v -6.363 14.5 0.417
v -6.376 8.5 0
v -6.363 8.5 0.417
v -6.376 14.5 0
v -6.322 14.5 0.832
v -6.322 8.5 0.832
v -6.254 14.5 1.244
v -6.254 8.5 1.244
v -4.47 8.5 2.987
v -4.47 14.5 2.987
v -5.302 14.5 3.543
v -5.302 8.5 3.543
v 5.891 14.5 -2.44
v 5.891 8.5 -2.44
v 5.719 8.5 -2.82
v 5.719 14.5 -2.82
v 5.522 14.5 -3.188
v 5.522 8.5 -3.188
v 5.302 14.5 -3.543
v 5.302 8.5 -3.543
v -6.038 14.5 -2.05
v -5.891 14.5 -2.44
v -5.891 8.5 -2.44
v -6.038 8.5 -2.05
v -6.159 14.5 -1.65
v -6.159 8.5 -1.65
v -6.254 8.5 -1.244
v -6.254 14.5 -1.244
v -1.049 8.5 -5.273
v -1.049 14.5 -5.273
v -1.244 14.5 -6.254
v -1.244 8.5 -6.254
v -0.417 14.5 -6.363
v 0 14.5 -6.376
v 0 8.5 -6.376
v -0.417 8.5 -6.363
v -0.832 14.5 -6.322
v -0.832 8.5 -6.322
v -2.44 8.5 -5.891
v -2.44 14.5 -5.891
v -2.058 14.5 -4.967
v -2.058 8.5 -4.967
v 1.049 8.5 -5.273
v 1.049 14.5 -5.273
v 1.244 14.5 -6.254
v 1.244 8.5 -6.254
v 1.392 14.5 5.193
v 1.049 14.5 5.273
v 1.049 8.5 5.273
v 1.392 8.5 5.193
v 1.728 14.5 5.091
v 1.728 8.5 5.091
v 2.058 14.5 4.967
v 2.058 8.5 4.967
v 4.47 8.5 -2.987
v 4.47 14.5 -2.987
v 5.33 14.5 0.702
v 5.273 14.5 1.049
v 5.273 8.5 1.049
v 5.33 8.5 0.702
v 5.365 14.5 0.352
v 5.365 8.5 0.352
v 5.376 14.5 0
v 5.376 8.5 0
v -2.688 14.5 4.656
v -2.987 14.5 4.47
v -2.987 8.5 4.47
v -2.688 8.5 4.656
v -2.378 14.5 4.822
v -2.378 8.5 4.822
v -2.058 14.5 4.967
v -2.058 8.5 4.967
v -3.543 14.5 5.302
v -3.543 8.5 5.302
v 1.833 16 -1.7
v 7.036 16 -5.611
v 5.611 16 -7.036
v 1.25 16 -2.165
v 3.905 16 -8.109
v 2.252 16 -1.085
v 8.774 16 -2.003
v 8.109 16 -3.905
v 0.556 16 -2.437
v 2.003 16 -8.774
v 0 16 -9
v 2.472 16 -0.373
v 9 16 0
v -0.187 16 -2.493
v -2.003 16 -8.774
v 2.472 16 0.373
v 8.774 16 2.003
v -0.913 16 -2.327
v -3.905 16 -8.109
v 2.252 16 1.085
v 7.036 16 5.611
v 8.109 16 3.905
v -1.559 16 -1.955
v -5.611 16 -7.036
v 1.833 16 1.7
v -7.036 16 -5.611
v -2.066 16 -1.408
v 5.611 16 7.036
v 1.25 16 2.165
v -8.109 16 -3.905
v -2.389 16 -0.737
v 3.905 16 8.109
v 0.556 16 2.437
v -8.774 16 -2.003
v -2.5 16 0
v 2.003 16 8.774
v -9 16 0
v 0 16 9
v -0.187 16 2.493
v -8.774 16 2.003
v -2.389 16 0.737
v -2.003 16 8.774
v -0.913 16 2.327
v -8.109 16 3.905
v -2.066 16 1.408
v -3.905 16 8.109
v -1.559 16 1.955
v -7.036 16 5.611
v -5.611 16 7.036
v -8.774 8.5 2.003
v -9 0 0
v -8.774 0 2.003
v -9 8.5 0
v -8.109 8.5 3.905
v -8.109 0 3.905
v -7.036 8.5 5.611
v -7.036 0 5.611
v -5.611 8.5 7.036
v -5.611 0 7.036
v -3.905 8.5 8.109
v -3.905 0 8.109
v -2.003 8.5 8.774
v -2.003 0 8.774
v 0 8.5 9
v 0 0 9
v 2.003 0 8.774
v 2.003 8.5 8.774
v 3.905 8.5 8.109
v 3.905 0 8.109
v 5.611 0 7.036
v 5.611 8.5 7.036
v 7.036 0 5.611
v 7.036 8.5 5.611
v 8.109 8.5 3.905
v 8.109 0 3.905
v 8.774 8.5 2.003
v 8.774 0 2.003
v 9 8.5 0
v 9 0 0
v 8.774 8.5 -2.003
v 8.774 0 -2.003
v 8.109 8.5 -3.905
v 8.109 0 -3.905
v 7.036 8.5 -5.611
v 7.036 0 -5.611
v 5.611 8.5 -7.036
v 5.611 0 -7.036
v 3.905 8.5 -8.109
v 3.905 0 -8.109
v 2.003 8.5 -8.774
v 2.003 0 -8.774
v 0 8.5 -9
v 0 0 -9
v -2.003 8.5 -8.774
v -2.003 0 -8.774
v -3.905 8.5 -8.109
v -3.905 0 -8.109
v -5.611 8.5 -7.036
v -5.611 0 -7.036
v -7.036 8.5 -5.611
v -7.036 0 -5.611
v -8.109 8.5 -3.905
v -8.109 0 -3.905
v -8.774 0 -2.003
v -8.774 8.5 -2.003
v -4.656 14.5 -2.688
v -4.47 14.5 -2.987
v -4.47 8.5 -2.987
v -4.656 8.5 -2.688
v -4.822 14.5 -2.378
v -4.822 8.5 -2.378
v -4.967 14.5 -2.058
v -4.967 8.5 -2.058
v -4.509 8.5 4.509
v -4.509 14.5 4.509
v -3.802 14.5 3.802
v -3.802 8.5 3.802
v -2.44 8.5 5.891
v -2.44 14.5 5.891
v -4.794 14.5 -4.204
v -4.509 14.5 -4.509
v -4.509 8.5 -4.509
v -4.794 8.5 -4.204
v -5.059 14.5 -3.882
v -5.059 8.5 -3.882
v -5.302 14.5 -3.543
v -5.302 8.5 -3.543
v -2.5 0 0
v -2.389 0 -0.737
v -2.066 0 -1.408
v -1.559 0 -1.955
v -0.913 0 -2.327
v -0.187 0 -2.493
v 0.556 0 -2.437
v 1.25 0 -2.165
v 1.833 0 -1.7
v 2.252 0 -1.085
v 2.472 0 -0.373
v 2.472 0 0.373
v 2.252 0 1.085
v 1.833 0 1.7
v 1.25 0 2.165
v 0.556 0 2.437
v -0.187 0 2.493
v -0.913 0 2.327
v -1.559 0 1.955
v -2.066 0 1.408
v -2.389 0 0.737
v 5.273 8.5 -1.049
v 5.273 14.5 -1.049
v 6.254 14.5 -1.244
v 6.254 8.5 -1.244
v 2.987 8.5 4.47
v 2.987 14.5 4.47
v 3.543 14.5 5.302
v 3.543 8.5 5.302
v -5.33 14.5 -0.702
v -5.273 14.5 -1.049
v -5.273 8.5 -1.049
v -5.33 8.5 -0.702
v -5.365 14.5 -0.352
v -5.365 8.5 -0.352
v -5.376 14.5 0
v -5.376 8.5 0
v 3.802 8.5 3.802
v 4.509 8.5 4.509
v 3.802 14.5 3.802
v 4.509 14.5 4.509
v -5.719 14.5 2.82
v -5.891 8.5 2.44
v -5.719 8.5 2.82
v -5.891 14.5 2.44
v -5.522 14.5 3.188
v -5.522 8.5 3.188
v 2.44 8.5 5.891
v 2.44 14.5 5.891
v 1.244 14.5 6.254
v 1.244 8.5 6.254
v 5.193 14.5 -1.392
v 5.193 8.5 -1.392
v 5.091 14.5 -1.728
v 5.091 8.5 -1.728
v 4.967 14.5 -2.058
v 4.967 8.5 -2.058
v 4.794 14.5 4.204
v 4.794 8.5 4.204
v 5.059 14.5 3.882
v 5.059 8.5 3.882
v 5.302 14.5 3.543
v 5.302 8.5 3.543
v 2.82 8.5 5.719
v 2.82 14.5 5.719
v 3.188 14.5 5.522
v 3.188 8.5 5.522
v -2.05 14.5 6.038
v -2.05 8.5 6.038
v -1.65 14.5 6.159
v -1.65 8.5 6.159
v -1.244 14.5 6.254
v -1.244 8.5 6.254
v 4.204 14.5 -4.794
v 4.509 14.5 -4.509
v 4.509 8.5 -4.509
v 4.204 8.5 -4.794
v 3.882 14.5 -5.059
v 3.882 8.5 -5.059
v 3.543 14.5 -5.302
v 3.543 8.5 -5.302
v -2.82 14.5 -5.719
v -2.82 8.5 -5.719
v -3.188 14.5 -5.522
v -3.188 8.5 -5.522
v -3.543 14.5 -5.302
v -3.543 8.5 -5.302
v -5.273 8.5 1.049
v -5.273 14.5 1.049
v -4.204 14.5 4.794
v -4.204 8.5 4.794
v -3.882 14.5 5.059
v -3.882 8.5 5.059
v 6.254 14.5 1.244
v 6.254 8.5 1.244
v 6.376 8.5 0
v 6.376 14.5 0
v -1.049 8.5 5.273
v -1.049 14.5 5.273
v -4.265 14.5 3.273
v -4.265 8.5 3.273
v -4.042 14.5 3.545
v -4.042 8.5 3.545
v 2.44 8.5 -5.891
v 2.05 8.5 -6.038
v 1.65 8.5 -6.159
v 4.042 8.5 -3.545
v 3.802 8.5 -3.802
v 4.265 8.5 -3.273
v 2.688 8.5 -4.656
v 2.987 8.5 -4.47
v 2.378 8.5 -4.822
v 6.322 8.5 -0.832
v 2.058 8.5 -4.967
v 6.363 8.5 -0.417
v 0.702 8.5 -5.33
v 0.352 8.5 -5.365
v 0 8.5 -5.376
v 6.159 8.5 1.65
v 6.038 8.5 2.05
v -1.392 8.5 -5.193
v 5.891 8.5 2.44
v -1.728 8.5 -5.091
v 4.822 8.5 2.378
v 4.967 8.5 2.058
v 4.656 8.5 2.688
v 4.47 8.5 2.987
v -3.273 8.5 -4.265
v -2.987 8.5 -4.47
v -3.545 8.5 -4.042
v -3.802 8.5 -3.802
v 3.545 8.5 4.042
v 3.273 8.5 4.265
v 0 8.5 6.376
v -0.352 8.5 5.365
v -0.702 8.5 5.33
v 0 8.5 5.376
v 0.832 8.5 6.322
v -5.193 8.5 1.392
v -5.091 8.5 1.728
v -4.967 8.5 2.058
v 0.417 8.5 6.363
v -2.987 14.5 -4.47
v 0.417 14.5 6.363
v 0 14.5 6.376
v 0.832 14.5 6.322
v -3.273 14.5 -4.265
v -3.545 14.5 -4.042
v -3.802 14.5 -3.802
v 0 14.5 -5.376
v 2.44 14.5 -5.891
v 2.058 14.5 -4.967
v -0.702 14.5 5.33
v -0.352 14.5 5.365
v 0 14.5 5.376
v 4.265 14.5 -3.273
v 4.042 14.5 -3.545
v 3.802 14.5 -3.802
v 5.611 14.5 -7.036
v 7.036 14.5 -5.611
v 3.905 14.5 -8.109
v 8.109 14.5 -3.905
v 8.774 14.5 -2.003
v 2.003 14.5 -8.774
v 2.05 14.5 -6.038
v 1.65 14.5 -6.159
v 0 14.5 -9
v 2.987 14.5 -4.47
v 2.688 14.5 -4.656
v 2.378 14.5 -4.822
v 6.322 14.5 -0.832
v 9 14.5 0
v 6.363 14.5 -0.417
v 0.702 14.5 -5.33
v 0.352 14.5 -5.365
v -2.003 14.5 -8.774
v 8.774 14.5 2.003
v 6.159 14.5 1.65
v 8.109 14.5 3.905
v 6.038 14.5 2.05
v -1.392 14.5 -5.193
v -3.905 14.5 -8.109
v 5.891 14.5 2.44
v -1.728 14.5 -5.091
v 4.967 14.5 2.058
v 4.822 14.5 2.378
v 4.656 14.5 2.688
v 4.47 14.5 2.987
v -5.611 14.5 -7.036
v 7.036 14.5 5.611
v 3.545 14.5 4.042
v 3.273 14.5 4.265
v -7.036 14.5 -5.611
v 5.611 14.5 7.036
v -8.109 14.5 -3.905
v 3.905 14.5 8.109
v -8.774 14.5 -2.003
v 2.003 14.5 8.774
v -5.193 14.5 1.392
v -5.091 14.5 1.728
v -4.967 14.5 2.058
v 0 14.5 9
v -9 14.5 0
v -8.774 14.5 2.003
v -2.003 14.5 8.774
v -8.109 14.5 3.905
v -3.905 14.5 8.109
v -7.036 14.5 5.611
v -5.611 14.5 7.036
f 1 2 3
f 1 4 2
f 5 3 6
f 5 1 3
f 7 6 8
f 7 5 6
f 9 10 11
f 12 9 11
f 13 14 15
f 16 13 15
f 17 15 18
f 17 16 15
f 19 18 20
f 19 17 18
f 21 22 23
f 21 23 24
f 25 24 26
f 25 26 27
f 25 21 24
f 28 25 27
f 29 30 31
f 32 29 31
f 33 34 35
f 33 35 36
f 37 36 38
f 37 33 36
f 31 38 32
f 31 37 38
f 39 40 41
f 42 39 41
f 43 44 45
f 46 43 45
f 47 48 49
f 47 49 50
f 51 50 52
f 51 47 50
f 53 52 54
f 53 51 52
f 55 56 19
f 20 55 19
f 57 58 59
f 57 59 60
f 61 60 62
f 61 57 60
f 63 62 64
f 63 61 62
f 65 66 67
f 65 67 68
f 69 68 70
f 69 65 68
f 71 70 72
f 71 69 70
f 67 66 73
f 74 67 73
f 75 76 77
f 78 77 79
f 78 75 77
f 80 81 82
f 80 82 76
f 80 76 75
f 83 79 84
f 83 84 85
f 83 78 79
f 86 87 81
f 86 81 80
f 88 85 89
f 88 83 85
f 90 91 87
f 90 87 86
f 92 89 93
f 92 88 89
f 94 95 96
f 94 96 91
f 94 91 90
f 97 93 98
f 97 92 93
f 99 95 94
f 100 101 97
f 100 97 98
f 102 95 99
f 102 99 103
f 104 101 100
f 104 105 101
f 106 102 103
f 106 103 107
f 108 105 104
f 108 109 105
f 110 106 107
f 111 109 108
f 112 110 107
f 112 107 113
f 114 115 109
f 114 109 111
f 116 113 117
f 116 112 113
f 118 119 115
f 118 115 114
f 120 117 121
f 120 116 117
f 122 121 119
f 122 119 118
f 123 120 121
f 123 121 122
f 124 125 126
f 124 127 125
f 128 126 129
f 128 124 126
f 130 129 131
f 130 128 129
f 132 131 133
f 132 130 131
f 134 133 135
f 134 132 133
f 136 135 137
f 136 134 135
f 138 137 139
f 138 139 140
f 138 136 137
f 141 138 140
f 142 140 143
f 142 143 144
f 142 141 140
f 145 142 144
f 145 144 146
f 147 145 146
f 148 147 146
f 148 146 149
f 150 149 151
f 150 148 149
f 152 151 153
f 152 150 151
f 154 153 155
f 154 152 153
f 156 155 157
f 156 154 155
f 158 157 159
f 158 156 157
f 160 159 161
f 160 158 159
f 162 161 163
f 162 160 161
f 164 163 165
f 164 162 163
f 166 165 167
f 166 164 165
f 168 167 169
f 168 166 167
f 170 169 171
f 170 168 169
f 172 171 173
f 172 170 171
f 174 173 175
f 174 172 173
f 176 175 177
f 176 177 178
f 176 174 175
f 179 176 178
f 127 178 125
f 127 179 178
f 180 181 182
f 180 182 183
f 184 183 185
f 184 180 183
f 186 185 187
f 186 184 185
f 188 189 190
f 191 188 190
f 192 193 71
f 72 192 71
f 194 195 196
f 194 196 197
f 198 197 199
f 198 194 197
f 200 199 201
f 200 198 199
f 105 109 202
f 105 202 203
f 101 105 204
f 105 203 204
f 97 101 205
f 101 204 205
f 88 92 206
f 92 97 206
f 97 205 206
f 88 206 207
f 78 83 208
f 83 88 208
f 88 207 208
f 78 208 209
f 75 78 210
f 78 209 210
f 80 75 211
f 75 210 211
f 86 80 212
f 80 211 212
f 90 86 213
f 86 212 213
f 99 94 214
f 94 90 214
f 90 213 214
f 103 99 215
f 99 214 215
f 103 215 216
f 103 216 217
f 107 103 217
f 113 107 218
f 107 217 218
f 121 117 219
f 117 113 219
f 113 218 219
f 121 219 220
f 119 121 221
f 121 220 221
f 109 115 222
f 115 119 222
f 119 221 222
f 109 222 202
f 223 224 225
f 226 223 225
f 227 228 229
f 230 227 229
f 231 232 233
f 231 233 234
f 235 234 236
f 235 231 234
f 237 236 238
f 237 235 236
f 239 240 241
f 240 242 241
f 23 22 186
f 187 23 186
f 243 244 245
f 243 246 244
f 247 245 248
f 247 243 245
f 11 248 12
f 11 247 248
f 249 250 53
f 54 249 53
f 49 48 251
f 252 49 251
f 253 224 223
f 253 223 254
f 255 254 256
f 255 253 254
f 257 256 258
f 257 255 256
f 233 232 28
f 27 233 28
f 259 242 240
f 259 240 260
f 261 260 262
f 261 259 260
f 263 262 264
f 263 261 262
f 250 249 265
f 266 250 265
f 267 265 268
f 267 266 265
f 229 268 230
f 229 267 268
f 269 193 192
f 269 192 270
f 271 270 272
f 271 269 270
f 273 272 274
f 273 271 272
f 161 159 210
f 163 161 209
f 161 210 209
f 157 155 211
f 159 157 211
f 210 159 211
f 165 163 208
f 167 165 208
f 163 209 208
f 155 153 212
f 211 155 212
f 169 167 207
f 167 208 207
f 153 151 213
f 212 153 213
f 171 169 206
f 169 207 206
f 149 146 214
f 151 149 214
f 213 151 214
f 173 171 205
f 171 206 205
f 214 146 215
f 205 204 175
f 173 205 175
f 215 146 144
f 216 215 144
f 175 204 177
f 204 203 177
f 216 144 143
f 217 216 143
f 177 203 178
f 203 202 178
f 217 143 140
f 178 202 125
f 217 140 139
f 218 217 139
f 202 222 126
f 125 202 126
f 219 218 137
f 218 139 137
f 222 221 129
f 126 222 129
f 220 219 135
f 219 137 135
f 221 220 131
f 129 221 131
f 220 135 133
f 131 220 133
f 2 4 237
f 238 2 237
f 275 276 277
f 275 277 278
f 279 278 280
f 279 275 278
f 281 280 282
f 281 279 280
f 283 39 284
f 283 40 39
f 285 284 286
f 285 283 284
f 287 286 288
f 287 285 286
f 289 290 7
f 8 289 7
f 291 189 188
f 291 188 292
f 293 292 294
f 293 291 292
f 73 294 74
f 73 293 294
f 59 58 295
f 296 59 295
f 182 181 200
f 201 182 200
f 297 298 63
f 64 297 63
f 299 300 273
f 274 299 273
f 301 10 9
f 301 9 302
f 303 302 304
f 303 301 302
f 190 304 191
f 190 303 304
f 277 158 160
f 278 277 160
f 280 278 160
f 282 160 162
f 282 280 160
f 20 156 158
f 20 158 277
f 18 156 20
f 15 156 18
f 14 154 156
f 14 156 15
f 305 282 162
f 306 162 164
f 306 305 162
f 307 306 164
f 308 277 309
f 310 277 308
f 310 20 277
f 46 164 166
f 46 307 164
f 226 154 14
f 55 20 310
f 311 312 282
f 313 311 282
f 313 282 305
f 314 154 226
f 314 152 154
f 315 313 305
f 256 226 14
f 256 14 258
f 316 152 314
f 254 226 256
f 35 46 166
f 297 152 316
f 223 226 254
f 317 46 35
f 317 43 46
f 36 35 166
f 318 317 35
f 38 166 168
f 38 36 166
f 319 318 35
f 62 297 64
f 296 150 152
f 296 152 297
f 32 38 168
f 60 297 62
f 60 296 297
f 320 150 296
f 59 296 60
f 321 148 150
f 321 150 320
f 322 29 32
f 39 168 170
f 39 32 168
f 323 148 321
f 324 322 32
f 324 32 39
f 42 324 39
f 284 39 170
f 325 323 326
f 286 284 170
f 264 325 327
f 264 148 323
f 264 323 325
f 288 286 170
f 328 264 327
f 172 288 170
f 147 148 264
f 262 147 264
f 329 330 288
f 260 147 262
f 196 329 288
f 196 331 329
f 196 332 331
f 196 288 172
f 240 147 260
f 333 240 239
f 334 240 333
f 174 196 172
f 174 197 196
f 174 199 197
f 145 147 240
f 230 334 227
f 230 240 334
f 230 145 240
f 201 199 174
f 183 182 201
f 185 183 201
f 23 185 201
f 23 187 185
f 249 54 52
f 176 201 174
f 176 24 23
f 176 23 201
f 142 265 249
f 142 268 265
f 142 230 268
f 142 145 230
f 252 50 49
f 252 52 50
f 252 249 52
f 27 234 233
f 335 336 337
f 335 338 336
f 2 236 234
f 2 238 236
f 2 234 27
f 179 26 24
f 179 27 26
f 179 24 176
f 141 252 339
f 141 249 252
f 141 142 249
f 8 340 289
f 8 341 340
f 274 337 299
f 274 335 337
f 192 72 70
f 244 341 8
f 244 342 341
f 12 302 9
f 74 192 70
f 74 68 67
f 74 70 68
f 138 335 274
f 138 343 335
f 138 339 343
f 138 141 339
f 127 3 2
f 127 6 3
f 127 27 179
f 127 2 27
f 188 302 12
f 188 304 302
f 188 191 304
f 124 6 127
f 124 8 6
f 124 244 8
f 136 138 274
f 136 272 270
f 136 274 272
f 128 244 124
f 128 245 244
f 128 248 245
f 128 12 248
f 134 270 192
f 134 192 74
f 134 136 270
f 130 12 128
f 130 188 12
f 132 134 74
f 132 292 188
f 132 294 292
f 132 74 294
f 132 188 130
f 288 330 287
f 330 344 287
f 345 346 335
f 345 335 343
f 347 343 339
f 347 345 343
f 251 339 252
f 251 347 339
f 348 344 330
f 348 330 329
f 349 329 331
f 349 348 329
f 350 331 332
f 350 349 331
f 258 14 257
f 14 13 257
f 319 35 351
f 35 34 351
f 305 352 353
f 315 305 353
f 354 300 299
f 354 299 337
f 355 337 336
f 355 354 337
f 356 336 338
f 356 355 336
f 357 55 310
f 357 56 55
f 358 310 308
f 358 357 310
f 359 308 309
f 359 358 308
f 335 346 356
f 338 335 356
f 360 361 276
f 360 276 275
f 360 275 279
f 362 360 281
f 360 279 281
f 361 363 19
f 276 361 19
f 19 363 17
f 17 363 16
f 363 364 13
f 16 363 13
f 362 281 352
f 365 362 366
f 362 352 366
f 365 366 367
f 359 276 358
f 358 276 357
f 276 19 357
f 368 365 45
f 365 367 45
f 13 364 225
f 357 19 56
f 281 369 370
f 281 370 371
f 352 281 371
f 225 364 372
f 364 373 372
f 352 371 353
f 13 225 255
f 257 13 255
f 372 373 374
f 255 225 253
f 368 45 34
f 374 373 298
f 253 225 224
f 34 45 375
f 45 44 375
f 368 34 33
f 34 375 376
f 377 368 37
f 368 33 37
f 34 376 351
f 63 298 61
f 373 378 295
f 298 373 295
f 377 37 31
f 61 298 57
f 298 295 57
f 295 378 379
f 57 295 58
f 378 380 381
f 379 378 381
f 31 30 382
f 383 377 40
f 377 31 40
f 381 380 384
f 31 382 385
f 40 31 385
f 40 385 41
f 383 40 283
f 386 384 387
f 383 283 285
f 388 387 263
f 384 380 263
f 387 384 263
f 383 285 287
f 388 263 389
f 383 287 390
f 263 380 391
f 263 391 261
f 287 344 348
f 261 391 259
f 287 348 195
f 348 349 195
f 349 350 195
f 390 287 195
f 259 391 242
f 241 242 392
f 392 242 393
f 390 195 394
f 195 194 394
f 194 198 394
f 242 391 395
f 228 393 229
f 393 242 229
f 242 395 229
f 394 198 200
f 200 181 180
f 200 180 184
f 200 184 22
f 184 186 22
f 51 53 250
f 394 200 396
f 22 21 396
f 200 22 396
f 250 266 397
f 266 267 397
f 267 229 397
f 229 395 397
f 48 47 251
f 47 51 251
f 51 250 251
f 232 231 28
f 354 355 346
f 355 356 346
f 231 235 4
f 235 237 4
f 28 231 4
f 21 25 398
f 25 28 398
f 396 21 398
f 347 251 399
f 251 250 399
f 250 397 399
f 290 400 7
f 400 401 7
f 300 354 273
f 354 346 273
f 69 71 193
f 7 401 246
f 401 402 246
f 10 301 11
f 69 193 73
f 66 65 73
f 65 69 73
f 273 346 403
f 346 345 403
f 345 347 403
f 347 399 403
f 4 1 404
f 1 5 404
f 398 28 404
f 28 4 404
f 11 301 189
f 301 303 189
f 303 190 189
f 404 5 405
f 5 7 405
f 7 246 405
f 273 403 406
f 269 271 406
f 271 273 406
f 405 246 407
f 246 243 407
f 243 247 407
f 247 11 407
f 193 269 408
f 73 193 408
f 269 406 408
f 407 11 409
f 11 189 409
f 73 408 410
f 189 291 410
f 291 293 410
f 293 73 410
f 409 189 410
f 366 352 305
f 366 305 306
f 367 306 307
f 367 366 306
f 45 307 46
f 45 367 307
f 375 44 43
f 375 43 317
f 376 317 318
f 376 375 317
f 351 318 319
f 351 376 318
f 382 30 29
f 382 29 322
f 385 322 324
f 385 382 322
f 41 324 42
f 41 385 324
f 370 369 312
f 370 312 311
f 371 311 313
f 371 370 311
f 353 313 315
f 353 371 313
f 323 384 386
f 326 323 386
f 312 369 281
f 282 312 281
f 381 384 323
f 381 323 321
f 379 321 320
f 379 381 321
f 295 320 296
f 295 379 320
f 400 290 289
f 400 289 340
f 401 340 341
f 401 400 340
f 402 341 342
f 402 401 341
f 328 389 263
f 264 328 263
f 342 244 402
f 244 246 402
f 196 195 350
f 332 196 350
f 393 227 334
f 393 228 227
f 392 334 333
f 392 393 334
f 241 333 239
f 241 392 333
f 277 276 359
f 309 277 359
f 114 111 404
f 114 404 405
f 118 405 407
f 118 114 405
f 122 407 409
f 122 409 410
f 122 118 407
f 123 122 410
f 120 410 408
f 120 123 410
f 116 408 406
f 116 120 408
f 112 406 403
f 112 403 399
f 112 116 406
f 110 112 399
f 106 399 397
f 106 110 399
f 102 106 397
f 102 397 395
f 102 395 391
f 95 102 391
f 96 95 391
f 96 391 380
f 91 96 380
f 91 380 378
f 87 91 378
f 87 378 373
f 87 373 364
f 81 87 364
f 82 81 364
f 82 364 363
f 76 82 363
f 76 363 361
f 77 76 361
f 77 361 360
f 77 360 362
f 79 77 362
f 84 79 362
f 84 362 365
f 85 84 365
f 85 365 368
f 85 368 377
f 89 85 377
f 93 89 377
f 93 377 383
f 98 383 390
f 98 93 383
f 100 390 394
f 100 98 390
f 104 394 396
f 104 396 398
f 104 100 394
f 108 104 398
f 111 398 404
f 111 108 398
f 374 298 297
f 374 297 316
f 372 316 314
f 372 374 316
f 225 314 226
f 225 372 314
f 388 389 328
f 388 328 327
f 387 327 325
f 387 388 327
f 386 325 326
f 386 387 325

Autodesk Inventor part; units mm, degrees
ref_plane "Work Plane1" through (0, 16, 0) normal (0, 1, 0) x (-1, 0, 0)
sketch "Sketch1" plane through (0, 16, 0) normal (0, 1, 0) x (-1, 0, 0)
  circle A0 centre (0, 0) radius 9
extrude "Extrusion3" add sketch "Sketch1" against normal blind 16
ref_plane "Work Plane2" through (0, 14.5, 0) normal (0, 1, 0) x (-1, 0, 0)
sketch "Sketch2" plane through (0, 14.5, 0) normal (0, 1, 0) x (-1, 0, 0)
  arc A0 (4.4703, 2.987) -> (3.8017, 3.8017) centre (0, 0) ccw
  line L0 (2.987, -4.4703) -> (3.5426, -5.3018)
  arc A1 (-5.8911, -2.4402) -> (-5.3018, -3.5426) centre (0, 0) ccw
  line L1 (-2.4402, 5.8911) -> (-2.0575, 4.9672)
  line L2 (2.987, 4.4703) -> (3.5426, 5.3018)
  arc A2 (4.5088, -4.5088) -> (5.3018, -3.5426) centre (0, 0) ccw
  line L3 (-4.5088, -4.5088) -> (-3.8017, -3.8017)
  arc A3 (-2.987, 4.4703) -> (-3.8017, 3.8017) centre (0, 0) ccw
  arc A4 (2.4402, 5.8911) -> (1.244, 6.2539) centre (0, 0) ccw
  line L4 (5.8911, -2.4402) -> (4.9672, -2.0575)
  arc A5 (-2.987, -4.4703) -> (-2.0575, -4.9672) centre (0, 0) ccw
  line L5 (-4.4703, 2.987) -> (-5.3018, 3.5426)
  line L6 (0, 6.3764) -> (0, 5.3764)
  arc A6 (5.2731, -1.0489) -> (5.3764, 0) centre (0, 0) ccw
  line L7 (-1.0489, -5.2731) -> (-1.244, -6.2539)
  arc A7 (-5.8911, 2.4402) -> (-6.2539, 1.244) centre (0, 0) ccw
  line L8 (5.2731, 1.0489) -> (6.2539, 1.244)
  arc A8 (0, -6.3764) -> (1.244, -6.2539) centre (0, 0) ccw
  line L9 (-6.3764, 0) -> (-5.3764, 0)
  arc A9 (5.8911, 2.4402) -> (5.3018, 3.5426) centre (0, 0) ccw
  line L10 (2.4402, -5.8911) -> (2.0575, -4.9672)
  arc A10 (-5.2731, -1.0489) -> (-4.9672, -2.0575) centre (0, 0) ccw
  line L11 (-1.0489, 5.2731) -> (-1.244, 6.2539)
  line L12 (4.5088, 4.5088) -> (3.8017, 3.8017)
  arc A11 (2.987, -4.4703) -> (3.8017, -3.8017) centre (0, 0) ccw
  line L13 (-4.4703, -2.987) -> (-5.3018, -3.5426)
  arc A12 (-2.4402, 5.8911) -> (-3.5426, 5.3018) centre (0, 0) ccw
  arc A13 (2.987, 4.4703) -> (2.0575, 4.9672) centre (0, 0) ccw
  line L14 (4.4703, -2.987) -> (5.3018, -3.5426)
  arc A14 (-4.5088, -4.5088) -> (-3.5426, -5.3018) centre (0, 0) ccw
  line L15 (-4.5088, 4.5088) -> (-3.8017, 3.8017)
  line L16 (1.0489, 5.2731) -> (1.244, 6.2539)
  arc A15 (5.8911, -2.4402) -> (6.2539, -1.244) centre (0, 0) ccw
  line L17 (-2.4402, -5.8911) -> (-2.0575, -4.9672)
  arc A16 (-4.4703, 2.987) -> (-4.9672, 2.0575) centre (0, 0) ccw
  arc A17 (0, 6.3764) -> (-1.244, 6.2539) centre (0, 0) ccw
  line L18 (6.3764, 0) -> (5.3764, 0)
  arc A18 (-1.0489, -5.2731) -> (0, -5.3764) centre (0, 0) ccw
  line L19 (-5.2731, 1.0489) -> (-6.2539, 1.244)
  arc A19 (5.2731, 1.0489) -> (4.9672, 2.0575) centre (0, 0) ccw
  line L20 (1.0489, -5.2731) -> (1.244, -6.2539)
  arc A20 (-6.3764, 0) -> (-6.2539, -1.244) centre (0, 0) ccw
  line L21 (4.4703, 2.987) -> (5.3018, 3.5426)
  arc A21 (2.4402, -5.8911) -> (3.5426, -5.3018) centre (0, 0) ccw
  line L22 (-5.8911, -2.4402) -> (-4.9672, -2.0575)
  arc A22 (-1.0489, 5.2731) -> (-2.0575, 4.9672) centre (0, 0) ccw
  arc A23 (4.5088, 4.5088) -> (3.5426, 5.3018) centre (0, 0) ccw
  line L23 (4.5088, -4.5088) -> (3.8017, -3.8017)
  arc A24 (-4.4703, -2.987) -> (-3.8017, -3.8017) centre (0, 0) ccw
  line L24 (-2.987, 4.4703) -> (-3.5426, 5.3018)
  line L25 (2.4402, 5.8911) -> (2.0575, 4.9672)
  arc A25 (4.4703, -2.987) -> (4.9672, -2.0575) centre (0, 0) ccw
  line L26 (-2.987, -4.4703) -> (-3.5426, -5.3018)
  arc A26 (-4.5088, 4.5088) -> (-5.3018, 3.5426) centre (0, 0) ccw
  arc A27 (1.0489, 5.2731) -> (0, 5.3764) centre (0, 0) ccw
  line L27 (5.2731, -1.0489) -> (6.2539, -1.244)
  arc A28 (-2.4402, -5.8911) -> (-1.244, -6.2539) centre (0, 0) ccw
  line L28 (-5.8911, 2.4402) -> (-4.9672, 2.0575)
  circle A29 centre (0, 0) radius 9
  arc A30 (6.3764, 0) -> (6.2539, 1.244) centre (0, 0) ccw
  line L29 (0, -6.3764) -> (0, -5.3764)
  arc A31 (-5.2731, 1.0489) -> (-5.3764, 0) centre (0, 0) ccw
  line L30 (5.8911, 2.4402) -> (4.9672, 2.0575)
  arc A32 (1.0489, -5.2731) -> (2.0575, -4.9672) centre (0, 0) ccw
  line L31 (-5.2731, -1.0489) -> (-6.2539, -1.244)
extrude "Extrusion2" cut sketch "Sketch2" against normal blind 6
sketch "Sketch3" plane through (0, 0, 0) normal (0, 1, 0) x (-1, 0, 0)
  circle A0 centre (0, 0) radius 2.5
extrude "Extrusion1" cut sketch "Sketch3" along normal blind 16
ref_plane "Work Plane3" through (0, 11.5, 0) normal (0, 1, 0) x (1, 0, 0)
properties part number "T2.5 16T Pulley" material "Aluminum 6061"
